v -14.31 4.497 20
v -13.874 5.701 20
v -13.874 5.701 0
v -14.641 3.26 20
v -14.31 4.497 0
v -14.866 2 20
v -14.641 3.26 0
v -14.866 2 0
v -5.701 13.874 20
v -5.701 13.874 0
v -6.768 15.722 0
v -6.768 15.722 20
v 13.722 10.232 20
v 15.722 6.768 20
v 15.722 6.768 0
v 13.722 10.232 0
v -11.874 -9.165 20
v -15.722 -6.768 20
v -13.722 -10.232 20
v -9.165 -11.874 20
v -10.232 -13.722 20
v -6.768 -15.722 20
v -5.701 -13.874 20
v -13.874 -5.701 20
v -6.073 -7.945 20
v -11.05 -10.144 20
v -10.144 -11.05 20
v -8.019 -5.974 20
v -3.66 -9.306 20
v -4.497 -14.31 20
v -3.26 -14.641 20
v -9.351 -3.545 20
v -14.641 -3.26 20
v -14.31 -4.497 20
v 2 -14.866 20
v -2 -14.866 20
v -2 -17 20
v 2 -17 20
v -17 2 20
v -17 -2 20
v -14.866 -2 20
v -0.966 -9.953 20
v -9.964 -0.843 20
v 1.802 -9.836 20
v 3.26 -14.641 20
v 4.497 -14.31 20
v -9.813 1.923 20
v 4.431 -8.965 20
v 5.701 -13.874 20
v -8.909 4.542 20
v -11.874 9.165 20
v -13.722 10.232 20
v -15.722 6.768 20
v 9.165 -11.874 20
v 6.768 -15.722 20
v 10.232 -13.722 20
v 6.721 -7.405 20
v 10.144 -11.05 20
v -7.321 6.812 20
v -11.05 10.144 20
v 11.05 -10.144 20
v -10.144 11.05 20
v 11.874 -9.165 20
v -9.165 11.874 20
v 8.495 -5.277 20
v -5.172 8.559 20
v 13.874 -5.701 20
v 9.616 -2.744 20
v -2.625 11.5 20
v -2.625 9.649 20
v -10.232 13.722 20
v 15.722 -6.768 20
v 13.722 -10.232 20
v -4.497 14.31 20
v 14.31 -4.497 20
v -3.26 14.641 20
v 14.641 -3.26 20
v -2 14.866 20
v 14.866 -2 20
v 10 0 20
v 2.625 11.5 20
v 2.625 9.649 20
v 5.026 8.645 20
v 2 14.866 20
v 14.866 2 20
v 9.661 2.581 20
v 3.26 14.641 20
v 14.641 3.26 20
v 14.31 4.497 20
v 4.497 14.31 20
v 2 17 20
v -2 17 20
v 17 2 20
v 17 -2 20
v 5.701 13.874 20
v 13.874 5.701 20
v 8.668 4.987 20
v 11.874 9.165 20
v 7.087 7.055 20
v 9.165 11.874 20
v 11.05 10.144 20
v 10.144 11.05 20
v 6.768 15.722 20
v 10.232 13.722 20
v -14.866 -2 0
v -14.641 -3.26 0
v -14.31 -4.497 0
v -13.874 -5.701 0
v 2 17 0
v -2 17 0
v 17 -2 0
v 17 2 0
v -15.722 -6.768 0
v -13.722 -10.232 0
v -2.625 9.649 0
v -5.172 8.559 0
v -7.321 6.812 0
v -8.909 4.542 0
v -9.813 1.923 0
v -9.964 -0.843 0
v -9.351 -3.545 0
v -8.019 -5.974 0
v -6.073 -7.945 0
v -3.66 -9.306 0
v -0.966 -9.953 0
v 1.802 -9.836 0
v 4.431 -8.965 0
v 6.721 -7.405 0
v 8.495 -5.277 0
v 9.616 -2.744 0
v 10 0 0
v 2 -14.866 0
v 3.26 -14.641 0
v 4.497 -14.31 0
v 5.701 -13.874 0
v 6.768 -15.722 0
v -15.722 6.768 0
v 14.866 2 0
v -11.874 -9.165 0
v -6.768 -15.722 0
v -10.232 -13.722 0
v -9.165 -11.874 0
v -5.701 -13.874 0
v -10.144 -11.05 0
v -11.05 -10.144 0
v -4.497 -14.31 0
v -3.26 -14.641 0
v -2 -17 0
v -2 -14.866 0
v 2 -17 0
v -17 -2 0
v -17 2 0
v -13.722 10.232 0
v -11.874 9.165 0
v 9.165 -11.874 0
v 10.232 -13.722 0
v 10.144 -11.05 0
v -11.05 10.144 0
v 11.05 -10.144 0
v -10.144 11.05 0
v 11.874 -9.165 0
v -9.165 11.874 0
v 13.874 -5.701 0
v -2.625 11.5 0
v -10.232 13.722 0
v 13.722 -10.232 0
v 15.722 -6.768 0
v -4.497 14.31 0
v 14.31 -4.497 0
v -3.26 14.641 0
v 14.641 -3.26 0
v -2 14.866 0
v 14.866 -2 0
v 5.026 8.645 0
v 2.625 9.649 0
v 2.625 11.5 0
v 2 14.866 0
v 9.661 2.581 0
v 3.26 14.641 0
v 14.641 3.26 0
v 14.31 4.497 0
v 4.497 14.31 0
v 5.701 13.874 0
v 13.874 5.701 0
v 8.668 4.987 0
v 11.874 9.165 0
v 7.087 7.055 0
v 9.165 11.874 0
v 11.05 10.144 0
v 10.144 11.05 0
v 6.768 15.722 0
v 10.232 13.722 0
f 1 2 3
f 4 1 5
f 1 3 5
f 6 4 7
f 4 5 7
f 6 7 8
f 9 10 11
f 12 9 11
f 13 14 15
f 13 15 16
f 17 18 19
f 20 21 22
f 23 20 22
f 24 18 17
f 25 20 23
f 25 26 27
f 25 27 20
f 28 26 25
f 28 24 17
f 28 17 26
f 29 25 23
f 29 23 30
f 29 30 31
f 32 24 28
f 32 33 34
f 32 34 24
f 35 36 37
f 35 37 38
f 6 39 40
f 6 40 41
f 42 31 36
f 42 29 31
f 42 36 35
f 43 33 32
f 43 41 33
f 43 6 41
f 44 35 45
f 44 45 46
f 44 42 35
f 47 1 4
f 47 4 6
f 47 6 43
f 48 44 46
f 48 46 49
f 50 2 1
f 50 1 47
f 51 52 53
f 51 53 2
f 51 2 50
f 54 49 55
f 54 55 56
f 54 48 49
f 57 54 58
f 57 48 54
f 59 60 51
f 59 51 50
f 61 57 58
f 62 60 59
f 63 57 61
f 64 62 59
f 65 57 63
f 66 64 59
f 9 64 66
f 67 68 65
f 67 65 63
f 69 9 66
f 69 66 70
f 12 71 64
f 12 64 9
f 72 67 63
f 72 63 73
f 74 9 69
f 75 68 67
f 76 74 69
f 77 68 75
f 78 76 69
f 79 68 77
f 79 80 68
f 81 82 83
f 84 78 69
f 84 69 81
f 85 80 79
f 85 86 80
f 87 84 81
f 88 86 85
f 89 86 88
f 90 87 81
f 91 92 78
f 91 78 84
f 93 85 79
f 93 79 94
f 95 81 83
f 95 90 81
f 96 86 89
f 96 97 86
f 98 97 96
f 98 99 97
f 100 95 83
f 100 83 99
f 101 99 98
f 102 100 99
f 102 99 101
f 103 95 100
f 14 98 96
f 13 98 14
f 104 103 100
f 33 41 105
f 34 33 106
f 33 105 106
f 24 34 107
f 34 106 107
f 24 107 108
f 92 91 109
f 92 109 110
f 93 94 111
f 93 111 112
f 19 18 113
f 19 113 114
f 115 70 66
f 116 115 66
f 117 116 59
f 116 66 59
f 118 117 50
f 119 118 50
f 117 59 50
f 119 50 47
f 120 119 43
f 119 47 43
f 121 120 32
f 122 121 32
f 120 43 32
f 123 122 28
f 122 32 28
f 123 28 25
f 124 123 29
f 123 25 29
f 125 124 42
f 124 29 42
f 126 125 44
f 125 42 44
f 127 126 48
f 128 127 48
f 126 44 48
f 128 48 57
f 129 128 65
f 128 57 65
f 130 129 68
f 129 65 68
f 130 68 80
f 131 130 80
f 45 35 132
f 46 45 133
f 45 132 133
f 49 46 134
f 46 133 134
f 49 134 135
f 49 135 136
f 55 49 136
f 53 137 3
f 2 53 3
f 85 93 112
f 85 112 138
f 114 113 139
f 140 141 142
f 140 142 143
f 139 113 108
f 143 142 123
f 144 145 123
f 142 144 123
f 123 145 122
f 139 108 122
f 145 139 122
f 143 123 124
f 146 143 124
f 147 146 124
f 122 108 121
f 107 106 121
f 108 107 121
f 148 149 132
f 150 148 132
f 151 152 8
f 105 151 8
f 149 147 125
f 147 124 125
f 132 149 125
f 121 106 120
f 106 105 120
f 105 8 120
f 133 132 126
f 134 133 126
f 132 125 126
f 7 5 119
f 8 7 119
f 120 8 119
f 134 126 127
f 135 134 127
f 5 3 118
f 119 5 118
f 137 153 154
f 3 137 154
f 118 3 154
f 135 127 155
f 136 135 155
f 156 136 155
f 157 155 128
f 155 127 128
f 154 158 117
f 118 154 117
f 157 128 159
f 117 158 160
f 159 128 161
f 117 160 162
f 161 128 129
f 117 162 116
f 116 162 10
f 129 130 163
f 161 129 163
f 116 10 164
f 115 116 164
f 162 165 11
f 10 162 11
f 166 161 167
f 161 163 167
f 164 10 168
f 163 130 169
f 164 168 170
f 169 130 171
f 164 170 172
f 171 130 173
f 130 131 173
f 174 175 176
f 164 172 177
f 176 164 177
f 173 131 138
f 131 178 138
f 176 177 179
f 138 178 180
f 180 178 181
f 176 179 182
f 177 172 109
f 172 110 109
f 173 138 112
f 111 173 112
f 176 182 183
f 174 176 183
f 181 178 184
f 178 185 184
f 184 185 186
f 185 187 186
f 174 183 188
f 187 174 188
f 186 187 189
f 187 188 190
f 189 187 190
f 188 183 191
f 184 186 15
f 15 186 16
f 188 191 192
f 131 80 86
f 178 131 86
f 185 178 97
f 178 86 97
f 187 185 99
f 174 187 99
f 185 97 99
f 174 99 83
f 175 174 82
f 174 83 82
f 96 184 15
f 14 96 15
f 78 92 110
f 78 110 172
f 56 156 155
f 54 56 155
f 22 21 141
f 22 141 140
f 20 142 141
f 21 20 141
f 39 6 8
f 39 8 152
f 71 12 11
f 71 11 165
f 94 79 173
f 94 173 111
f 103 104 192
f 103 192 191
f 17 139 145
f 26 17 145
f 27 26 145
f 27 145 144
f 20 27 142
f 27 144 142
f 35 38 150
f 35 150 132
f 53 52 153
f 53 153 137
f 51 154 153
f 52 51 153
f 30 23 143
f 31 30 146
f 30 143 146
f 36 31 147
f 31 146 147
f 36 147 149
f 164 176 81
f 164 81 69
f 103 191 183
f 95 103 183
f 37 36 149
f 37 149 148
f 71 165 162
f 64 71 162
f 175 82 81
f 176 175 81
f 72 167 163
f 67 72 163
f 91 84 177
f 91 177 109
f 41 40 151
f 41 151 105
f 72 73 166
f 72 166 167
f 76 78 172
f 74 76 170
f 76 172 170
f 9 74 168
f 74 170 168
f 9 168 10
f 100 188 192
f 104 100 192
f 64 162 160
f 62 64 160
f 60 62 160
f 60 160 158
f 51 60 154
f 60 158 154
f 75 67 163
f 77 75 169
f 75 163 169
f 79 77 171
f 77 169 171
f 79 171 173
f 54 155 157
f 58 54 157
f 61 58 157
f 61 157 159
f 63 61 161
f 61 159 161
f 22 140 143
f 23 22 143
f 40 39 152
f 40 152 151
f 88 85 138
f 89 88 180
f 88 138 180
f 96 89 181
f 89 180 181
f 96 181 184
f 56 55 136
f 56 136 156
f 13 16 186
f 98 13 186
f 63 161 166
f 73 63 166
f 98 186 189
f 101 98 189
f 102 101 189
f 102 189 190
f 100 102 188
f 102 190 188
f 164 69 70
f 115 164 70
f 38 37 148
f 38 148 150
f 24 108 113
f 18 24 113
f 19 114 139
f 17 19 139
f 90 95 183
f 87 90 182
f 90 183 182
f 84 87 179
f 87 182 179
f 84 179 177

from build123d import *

# Parameters (mm, degrees)
EXTRUDE_1_DEPTH     = 20
CUT_EXTRUDE_2_DEPTH = 32.272991542


with BuildPart() as part:
    # 草图1 → 凸台-拉伸1 (new body)
    with BuildSketch(Plane.XY):
        with BuildLine():
            Line((6.767949192, 15.722431864), (5.700983566, 13.87439319))
            ThreePointArc((5.700983566, 13.87439319), (3.882285677, 14.488887394), (2, 14.866068747))
            Line((2, 14.866068747), (2, 17))
            Line((2, 17), (-2, 17))
            Line((-2, 17), (-2, 14.866068747))
            ThreePointArc((-2, 14.866068747), (-3.882285677, 14.488887394), (-5.700983566, 13.87439319))
            Line((-5.700983566, 13.87439319), (-6.767949192, 15.722431864))
            Line((-6.767949192, 15.722431864), (-10.232050808, 13.722431864))
            Line((-10.232050808, 13.722431864), (-9.165085181, 11.87439319))
            ThreePointArc((-9.165085181, 11.87439319), (-10.606601718, 10.606601718), (-11.87439319, 9.165085181))
            Line((-11.87439319, 9.165085181), (-13.722431864, 10.232050808))
            Line((-13.722431864, 10.232050808), (-15.722431864, 6.767949192))
            Line((-15.722431864, 6.767949192), (-13.87439319, 5.700983566))
            ThreePointArc((-13.87439319, 5.700983566), (-14.488887394, 3.882285677), (-14.866068747, 2))
            Line((-14.866068747, 2), (-17, 2))
            Line((-17, 2), (-17, -2))
            Line((-17, -2), (-14.866068747, -2))
            ThreePointArc((-14.866068747, -2), (-14.488887394, -3.882285677), (-13.87439319, -5.700983566))
            Line((-13.87439319, -5.700983566), (-15.722431864, -6.767949192))
            Line((-15.722431864, -6.767949192), (-13.722431864, -10.232050808))
            Line((-13.722431864, -10.232050808), (-11.87439319, -9.165085181))
            ThreePointArc((-11.87439319, -9.165085181), (-10.606601718, -10.606601718), (-9.165085181, -11.87439319))
            Line((-9.165085181, -11.87439319), (-10.232050808, -13.722431864))
            Line((-10.232050808, -13.722431864), (-6.767949192, -15.722431864))
            Line((-6.767949192, -15.722431864), (-5.700983566, -13.87439319))
            ThreePointArc((-5.700983566, -13.87439319), (-3.882285677, -14.488887394), (-2, -14.866068747))
            Line((-2, -14.866068747), (-2, -17))
            Line((-2, -17), (2, -17))
            Line((2, -17), (2, -14.866068747))
            ThreePointArc((2, -14.866068747), (3.882285677, -14.488887394), (5.700983566, -13.87439319))
            Line((5.700983566, -13.87439319), (6.767949192, -15.722431864))
            Line((6.767949192, -15.722431864), (10.232050808, -13.722431864))
            Line((10.232050808, -13.722431864), (9.165085181, -11.87439319))
            ThreePointArc((9.165085181, -11.87439319), (10.606601718, -10.606601718), (11.87439319, -9.165085181))
            Line((11.87439319, -9.165085181), (13.722431864, -10.232050808))
            Line((13.722431864, -10.232050808), (15.722431864, -6.767949192))
            Line((15.722431864, -6.767949192), (13.87439319, -5.700983566))
            ThreePointArc((13.87439319, -5.700983566), (14.488887394, -3.882285677), (14.866068747, -2))
            Line((14.866068747, -2), (17, -2))
            Line((17, -2), (17, 2))
            Line((17, 2), (14.866068747, 2))
            ThreePointArc((14.866068747, 2), (14.488887394, 3.882285677), (13.87439319, 5.700983566))
            Line((13.87439319, 5.700983566), (15.722431864, 6.767949192))
            Line((15.722431864, 6.767949192), (13.722431864, 10.232050808))
            Line((13.722431864, 10.232050808), (11.87439319, 9.165085181))
            ThreePointArc((11.87439319, 9.165085181), (10.606601718, 10.606601718), (9.165085181, 11.87439319))
            Line((9.165085181, 11.87439319), (10.232050808, 13.722431864))
            Line((10.232050808, 13.722431864), (6.767949192, 15.722431864))
        make_face()
    extrude(amount=EXTRUDE_1_DEPTH)

    # 草图2 → 切除-拉伸2 (cut, through all)
    with BuildSketch(Plane.XY.offset(20)):
        with BuildLine():
            Line((2.624865364, 11.5), (-2.624865364, 11.5))
            Line((-2.624865364, 11.5), (-2.624865364, 9.64935655))
            ThreePointArc((-2.624865364, 9.64935655), (0, 10), (2.624865364, 9.64935655))
            Line((2.624865364, 9.64935655), (2.624865364, 11.5))
        make_face()
        with BuildLine():
            ThreePointArc((2.624865364, 9.64935655), (0, 10), (-2.624865364, 9.64935655))
            Line((-2.624865364, 9.64935655), (-2.624865364, 8.5))
            Line((-2.624865364, 8.5), (2.624865364, 8.5))
            Line((2.624865364, 8.5), (2.624865364, 9.64935655))
        make_face()
        with BuildLine():
            Line((-2.624865364, 8.5), (-2.624865364, 9.64935655))
            ThreePointArc((-2.624865364, 9.64935655), (-6.072534329, -7.945081927), (10, 0))
            ThreePointArc((10, 0), (7.945081927, 6.072534329), (2.624865364, 9.64935655))
            Line((2.624865364, 9.64935655), (2.624865364, 8.5))
            Line((2.624865364, 8.5), (-2.624865364, 8.5))
        make_face()
    extrude(amount=-CUT_EXTRUDE_2_DEPTH, mode=Mode.SUBTRACT)


solid = part.part
